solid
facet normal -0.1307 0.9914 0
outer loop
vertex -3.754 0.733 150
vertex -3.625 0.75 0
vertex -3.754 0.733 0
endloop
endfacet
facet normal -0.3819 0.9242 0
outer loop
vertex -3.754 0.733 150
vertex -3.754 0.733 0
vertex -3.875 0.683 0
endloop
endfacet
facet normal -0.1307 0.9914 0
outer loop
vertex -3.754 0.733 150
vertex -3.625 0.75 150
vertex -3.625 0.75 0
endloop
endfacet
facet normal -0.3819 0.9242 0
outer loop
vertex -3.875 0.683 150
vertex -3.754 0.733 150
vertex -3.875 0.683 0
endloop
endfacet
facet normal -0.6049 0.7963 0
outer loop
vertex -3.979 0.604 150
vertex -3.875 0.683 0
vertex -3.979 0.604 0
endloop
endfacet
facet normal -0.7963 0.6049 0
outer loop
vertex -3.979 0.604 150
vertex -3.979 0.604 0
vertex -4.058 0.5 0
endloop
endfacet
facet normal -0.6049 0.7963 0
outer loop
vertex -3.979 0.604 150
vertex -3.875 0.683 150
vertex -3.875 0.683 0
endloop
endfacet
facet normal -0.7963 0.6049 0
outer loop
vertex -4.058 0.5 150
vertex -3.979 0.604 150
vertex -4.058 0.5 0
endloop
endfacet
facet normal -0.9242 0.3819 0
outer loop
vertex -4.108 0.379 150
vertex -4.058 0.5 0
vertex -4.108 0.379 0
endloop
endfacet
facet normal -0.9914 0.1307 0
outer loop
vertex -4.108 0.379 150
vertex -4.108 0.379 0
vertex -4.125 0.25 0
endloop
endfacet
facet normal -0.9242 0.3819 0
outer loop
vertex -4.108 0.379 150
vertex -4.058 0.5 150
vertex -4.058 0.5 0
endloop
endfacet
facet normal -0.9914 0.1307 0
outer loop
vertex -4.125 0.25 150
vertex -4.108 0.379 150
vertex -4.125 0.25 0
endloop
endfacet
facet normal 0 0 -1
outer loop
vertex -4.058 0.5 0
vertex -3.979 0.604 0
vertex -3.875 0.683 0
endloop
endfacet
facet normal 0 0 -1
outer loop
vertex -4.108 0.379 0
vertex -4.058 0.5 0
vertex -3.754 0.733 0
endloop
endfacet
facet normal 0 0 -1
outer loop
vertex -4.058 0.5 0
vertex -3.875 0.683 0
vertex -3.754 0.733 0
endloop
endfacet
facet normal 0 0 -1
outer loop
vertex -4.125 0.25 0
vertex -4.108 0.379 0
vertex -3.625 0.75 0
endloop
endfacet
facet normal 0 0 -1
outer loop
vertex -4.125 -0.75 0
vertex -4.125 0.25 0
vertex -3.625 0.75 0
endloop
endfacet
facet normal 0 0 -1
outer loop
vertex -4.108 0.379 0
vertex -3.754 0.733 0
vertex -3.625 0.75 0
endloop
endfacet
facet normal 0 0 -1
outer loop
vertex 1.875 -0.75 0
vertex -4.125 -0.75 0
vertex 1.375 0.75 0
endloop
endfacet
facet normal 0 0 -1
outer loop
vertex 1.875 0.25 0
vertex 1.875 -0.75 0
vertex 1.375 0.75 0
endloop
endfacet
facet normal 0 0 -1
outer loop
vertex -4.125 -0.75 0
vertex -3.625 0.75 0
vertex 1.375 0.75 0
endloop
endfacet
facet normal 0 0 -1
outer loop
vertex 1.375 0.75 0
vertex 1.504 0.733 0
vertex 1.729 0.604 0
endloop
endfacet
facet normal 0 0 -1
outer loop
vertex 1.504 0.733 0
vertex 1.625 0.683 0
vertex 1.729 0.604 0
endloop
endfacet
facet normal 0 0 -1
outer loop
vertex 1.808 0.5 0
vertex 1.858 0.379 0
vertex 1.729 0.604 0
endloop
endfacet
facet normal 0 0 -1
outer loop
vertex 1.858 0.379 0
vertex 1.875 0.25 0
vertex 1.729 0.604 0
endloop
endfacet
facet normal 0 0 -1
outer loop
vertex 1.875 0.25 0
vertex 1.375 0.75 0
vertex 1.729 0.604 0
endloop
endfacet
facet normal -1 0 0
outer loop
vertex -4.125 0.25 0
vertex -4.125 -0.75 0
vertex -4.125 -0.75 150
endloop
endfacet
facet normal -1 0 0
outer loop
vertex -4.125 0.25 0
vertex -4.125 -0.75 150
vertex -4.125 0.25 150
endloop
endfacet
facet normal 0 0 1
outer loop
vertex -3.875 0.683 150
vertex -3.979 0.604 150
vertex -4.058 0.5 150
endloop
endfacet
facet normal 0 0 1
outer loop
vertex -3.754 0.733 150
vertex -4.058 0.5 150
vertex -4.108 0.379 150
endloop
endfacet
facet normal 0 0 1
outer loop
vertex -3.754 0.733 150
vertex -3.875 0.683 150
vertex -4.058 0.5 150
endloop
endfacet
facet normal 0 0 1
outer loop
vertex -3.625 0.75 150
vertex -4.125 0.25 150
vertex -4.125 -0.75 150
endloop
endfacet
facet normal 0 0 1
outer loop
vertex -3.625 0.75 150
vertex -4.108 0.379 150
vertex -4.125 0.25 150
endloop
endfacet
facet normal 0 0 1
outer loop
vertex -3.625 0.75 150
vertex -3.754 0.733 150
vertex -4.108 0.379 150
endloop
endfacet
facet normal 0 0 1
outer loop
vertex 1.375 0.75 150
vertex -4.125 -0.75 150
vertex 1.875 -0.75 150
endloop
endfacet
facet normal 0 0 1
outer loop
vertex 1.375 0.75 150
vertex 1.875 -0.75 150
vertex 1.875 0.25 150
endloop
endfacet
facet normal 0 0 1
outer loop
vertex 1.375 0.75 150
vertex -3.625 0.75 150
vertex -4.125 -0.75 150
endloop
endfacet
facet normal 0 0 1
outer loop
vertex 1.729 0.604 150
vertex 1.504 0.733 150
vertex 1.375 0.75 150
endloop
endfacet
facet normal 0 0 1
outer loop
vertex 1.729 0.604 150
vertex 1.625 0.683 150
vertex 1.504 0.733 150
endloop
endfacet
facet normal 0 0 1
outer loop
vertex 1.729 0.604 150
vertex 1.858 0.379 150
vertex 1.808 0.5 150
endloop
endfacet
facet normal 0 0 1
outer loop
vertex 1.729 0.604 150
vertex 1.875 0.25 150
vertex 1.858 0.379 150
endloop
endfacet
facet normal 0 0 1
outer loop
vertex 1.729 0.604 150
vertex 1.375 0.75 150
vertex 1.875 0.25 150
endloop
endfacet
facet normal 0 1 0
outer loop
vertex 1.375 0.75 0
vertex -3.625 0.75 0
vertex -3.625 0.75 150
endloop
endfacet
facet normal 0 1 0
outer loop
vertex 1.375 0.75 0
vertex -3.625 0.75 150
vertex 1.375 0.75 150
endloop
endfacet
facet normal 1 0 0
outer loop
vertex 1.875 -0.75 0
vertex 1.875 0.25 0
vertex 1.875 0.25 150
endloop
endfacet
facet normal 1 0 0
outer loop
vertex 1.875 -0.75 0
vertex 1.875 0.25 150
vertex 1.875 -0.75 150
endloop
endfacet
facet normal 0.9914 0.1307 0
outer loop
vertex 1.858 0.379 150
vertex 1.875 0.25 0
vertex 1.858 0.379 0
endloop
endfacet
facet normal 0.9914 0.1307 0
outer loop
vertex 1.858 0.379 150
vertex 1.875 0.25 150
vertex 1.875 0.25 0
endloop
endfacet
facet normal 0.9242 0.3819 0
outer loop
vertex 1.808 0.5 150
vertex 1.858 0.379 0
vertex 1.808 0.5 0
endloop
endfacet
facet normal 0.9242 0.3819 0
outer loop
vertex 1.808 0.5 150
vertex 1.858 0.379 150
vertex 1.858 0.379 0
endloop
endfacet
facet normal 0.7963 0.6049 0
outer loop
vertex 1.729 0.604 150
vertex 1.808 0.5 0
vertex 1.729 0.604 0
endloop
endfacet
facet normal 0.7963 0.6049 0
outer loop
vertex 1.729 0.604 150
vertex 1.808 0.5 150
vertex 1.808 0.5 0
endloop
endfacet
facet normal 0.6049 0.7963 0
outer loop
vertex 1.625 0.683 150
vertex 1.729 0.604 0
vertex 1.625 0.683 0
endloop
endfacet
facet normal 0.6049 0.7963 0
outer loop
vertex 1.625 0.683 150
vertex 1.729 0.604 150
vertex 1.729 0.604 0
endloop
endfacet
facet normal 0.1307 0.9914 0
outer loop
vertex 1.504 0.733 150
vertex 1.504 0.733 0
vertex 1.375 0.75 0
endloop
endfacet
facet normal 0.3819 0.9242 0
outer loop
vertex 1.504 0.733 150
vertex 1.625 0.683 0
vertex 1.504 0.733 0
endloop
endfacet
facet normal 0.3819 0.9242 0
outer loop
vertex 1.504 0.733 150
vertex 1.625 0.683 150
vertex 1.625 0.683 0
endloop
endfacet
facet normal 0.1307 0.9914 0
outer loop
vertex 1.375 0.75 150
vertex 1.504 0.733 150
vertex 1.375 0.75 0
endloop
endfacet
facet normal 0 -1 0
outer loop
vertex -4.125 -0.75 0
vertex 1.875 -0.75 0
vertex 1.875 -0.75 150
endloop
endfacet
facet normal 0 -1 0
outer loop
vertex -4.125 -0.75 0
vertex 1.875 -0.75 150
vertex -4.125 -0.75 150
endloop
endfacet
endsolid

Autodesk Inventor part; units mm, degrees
ref_plane "YZ Plane" through (0, 0, 0) normal (1, 0, 0) x (0, 1, 0)
ref_plane "XZ Plane" through (0, 0, 0) normal (0, 1, 0) x (-1, 0, 0)
ref_plane "XY Plane" through (0, 0, 0) normal (0, 0, 1) x (1, 0, 0)
sketch "Sketch1" plane through (0, 0, 0) normal (0, 0, 1) x (1, 0, 0)
  line L0 (-4.125, 0.75) -> (1.875, 0.75)
  line L1 (1.875, 0.75) -> (1.875, -0.75)
  line L2 (1.875, -0.75) -> (-4.125, -0.75)
  line L3 (-4.125, -0.75) -> (-4.125, 0.75)
  point P0 (0, 0)
  dimension "d0" = 6
  dimension "d1" = 1.5
extrude "Extrusion1" add sketch "Sketch1" along normal blind 150
sketch "Sketch2" plane through (-4.125, -0.75, 0) normal (0, -1, 0) x (1, 0, 0)
  line L0 (0, 0) -> (6, 0) projected
  line L1 (6, 0) -> (6, 150) projected
  line L2 (0, 150) -> (6, 150) projected
  line L3 (0, 0) -> (0, 150) projected
  line L4 (0, 146) -> (6, 146)
  circle A0 centre (3, 148) radius 2
  line L5 (0, 150) -> (6, 150) projected
  point P0 (4.125, 0)
  dimension "d4" = 4
  dimension "d5" = 3
fillet "Fillet1" radius 0.5 2 edges at (1.875, 0.75, 75) (-4.125, 0.75, 75)
properties part number "McCrea_doska_walle"
